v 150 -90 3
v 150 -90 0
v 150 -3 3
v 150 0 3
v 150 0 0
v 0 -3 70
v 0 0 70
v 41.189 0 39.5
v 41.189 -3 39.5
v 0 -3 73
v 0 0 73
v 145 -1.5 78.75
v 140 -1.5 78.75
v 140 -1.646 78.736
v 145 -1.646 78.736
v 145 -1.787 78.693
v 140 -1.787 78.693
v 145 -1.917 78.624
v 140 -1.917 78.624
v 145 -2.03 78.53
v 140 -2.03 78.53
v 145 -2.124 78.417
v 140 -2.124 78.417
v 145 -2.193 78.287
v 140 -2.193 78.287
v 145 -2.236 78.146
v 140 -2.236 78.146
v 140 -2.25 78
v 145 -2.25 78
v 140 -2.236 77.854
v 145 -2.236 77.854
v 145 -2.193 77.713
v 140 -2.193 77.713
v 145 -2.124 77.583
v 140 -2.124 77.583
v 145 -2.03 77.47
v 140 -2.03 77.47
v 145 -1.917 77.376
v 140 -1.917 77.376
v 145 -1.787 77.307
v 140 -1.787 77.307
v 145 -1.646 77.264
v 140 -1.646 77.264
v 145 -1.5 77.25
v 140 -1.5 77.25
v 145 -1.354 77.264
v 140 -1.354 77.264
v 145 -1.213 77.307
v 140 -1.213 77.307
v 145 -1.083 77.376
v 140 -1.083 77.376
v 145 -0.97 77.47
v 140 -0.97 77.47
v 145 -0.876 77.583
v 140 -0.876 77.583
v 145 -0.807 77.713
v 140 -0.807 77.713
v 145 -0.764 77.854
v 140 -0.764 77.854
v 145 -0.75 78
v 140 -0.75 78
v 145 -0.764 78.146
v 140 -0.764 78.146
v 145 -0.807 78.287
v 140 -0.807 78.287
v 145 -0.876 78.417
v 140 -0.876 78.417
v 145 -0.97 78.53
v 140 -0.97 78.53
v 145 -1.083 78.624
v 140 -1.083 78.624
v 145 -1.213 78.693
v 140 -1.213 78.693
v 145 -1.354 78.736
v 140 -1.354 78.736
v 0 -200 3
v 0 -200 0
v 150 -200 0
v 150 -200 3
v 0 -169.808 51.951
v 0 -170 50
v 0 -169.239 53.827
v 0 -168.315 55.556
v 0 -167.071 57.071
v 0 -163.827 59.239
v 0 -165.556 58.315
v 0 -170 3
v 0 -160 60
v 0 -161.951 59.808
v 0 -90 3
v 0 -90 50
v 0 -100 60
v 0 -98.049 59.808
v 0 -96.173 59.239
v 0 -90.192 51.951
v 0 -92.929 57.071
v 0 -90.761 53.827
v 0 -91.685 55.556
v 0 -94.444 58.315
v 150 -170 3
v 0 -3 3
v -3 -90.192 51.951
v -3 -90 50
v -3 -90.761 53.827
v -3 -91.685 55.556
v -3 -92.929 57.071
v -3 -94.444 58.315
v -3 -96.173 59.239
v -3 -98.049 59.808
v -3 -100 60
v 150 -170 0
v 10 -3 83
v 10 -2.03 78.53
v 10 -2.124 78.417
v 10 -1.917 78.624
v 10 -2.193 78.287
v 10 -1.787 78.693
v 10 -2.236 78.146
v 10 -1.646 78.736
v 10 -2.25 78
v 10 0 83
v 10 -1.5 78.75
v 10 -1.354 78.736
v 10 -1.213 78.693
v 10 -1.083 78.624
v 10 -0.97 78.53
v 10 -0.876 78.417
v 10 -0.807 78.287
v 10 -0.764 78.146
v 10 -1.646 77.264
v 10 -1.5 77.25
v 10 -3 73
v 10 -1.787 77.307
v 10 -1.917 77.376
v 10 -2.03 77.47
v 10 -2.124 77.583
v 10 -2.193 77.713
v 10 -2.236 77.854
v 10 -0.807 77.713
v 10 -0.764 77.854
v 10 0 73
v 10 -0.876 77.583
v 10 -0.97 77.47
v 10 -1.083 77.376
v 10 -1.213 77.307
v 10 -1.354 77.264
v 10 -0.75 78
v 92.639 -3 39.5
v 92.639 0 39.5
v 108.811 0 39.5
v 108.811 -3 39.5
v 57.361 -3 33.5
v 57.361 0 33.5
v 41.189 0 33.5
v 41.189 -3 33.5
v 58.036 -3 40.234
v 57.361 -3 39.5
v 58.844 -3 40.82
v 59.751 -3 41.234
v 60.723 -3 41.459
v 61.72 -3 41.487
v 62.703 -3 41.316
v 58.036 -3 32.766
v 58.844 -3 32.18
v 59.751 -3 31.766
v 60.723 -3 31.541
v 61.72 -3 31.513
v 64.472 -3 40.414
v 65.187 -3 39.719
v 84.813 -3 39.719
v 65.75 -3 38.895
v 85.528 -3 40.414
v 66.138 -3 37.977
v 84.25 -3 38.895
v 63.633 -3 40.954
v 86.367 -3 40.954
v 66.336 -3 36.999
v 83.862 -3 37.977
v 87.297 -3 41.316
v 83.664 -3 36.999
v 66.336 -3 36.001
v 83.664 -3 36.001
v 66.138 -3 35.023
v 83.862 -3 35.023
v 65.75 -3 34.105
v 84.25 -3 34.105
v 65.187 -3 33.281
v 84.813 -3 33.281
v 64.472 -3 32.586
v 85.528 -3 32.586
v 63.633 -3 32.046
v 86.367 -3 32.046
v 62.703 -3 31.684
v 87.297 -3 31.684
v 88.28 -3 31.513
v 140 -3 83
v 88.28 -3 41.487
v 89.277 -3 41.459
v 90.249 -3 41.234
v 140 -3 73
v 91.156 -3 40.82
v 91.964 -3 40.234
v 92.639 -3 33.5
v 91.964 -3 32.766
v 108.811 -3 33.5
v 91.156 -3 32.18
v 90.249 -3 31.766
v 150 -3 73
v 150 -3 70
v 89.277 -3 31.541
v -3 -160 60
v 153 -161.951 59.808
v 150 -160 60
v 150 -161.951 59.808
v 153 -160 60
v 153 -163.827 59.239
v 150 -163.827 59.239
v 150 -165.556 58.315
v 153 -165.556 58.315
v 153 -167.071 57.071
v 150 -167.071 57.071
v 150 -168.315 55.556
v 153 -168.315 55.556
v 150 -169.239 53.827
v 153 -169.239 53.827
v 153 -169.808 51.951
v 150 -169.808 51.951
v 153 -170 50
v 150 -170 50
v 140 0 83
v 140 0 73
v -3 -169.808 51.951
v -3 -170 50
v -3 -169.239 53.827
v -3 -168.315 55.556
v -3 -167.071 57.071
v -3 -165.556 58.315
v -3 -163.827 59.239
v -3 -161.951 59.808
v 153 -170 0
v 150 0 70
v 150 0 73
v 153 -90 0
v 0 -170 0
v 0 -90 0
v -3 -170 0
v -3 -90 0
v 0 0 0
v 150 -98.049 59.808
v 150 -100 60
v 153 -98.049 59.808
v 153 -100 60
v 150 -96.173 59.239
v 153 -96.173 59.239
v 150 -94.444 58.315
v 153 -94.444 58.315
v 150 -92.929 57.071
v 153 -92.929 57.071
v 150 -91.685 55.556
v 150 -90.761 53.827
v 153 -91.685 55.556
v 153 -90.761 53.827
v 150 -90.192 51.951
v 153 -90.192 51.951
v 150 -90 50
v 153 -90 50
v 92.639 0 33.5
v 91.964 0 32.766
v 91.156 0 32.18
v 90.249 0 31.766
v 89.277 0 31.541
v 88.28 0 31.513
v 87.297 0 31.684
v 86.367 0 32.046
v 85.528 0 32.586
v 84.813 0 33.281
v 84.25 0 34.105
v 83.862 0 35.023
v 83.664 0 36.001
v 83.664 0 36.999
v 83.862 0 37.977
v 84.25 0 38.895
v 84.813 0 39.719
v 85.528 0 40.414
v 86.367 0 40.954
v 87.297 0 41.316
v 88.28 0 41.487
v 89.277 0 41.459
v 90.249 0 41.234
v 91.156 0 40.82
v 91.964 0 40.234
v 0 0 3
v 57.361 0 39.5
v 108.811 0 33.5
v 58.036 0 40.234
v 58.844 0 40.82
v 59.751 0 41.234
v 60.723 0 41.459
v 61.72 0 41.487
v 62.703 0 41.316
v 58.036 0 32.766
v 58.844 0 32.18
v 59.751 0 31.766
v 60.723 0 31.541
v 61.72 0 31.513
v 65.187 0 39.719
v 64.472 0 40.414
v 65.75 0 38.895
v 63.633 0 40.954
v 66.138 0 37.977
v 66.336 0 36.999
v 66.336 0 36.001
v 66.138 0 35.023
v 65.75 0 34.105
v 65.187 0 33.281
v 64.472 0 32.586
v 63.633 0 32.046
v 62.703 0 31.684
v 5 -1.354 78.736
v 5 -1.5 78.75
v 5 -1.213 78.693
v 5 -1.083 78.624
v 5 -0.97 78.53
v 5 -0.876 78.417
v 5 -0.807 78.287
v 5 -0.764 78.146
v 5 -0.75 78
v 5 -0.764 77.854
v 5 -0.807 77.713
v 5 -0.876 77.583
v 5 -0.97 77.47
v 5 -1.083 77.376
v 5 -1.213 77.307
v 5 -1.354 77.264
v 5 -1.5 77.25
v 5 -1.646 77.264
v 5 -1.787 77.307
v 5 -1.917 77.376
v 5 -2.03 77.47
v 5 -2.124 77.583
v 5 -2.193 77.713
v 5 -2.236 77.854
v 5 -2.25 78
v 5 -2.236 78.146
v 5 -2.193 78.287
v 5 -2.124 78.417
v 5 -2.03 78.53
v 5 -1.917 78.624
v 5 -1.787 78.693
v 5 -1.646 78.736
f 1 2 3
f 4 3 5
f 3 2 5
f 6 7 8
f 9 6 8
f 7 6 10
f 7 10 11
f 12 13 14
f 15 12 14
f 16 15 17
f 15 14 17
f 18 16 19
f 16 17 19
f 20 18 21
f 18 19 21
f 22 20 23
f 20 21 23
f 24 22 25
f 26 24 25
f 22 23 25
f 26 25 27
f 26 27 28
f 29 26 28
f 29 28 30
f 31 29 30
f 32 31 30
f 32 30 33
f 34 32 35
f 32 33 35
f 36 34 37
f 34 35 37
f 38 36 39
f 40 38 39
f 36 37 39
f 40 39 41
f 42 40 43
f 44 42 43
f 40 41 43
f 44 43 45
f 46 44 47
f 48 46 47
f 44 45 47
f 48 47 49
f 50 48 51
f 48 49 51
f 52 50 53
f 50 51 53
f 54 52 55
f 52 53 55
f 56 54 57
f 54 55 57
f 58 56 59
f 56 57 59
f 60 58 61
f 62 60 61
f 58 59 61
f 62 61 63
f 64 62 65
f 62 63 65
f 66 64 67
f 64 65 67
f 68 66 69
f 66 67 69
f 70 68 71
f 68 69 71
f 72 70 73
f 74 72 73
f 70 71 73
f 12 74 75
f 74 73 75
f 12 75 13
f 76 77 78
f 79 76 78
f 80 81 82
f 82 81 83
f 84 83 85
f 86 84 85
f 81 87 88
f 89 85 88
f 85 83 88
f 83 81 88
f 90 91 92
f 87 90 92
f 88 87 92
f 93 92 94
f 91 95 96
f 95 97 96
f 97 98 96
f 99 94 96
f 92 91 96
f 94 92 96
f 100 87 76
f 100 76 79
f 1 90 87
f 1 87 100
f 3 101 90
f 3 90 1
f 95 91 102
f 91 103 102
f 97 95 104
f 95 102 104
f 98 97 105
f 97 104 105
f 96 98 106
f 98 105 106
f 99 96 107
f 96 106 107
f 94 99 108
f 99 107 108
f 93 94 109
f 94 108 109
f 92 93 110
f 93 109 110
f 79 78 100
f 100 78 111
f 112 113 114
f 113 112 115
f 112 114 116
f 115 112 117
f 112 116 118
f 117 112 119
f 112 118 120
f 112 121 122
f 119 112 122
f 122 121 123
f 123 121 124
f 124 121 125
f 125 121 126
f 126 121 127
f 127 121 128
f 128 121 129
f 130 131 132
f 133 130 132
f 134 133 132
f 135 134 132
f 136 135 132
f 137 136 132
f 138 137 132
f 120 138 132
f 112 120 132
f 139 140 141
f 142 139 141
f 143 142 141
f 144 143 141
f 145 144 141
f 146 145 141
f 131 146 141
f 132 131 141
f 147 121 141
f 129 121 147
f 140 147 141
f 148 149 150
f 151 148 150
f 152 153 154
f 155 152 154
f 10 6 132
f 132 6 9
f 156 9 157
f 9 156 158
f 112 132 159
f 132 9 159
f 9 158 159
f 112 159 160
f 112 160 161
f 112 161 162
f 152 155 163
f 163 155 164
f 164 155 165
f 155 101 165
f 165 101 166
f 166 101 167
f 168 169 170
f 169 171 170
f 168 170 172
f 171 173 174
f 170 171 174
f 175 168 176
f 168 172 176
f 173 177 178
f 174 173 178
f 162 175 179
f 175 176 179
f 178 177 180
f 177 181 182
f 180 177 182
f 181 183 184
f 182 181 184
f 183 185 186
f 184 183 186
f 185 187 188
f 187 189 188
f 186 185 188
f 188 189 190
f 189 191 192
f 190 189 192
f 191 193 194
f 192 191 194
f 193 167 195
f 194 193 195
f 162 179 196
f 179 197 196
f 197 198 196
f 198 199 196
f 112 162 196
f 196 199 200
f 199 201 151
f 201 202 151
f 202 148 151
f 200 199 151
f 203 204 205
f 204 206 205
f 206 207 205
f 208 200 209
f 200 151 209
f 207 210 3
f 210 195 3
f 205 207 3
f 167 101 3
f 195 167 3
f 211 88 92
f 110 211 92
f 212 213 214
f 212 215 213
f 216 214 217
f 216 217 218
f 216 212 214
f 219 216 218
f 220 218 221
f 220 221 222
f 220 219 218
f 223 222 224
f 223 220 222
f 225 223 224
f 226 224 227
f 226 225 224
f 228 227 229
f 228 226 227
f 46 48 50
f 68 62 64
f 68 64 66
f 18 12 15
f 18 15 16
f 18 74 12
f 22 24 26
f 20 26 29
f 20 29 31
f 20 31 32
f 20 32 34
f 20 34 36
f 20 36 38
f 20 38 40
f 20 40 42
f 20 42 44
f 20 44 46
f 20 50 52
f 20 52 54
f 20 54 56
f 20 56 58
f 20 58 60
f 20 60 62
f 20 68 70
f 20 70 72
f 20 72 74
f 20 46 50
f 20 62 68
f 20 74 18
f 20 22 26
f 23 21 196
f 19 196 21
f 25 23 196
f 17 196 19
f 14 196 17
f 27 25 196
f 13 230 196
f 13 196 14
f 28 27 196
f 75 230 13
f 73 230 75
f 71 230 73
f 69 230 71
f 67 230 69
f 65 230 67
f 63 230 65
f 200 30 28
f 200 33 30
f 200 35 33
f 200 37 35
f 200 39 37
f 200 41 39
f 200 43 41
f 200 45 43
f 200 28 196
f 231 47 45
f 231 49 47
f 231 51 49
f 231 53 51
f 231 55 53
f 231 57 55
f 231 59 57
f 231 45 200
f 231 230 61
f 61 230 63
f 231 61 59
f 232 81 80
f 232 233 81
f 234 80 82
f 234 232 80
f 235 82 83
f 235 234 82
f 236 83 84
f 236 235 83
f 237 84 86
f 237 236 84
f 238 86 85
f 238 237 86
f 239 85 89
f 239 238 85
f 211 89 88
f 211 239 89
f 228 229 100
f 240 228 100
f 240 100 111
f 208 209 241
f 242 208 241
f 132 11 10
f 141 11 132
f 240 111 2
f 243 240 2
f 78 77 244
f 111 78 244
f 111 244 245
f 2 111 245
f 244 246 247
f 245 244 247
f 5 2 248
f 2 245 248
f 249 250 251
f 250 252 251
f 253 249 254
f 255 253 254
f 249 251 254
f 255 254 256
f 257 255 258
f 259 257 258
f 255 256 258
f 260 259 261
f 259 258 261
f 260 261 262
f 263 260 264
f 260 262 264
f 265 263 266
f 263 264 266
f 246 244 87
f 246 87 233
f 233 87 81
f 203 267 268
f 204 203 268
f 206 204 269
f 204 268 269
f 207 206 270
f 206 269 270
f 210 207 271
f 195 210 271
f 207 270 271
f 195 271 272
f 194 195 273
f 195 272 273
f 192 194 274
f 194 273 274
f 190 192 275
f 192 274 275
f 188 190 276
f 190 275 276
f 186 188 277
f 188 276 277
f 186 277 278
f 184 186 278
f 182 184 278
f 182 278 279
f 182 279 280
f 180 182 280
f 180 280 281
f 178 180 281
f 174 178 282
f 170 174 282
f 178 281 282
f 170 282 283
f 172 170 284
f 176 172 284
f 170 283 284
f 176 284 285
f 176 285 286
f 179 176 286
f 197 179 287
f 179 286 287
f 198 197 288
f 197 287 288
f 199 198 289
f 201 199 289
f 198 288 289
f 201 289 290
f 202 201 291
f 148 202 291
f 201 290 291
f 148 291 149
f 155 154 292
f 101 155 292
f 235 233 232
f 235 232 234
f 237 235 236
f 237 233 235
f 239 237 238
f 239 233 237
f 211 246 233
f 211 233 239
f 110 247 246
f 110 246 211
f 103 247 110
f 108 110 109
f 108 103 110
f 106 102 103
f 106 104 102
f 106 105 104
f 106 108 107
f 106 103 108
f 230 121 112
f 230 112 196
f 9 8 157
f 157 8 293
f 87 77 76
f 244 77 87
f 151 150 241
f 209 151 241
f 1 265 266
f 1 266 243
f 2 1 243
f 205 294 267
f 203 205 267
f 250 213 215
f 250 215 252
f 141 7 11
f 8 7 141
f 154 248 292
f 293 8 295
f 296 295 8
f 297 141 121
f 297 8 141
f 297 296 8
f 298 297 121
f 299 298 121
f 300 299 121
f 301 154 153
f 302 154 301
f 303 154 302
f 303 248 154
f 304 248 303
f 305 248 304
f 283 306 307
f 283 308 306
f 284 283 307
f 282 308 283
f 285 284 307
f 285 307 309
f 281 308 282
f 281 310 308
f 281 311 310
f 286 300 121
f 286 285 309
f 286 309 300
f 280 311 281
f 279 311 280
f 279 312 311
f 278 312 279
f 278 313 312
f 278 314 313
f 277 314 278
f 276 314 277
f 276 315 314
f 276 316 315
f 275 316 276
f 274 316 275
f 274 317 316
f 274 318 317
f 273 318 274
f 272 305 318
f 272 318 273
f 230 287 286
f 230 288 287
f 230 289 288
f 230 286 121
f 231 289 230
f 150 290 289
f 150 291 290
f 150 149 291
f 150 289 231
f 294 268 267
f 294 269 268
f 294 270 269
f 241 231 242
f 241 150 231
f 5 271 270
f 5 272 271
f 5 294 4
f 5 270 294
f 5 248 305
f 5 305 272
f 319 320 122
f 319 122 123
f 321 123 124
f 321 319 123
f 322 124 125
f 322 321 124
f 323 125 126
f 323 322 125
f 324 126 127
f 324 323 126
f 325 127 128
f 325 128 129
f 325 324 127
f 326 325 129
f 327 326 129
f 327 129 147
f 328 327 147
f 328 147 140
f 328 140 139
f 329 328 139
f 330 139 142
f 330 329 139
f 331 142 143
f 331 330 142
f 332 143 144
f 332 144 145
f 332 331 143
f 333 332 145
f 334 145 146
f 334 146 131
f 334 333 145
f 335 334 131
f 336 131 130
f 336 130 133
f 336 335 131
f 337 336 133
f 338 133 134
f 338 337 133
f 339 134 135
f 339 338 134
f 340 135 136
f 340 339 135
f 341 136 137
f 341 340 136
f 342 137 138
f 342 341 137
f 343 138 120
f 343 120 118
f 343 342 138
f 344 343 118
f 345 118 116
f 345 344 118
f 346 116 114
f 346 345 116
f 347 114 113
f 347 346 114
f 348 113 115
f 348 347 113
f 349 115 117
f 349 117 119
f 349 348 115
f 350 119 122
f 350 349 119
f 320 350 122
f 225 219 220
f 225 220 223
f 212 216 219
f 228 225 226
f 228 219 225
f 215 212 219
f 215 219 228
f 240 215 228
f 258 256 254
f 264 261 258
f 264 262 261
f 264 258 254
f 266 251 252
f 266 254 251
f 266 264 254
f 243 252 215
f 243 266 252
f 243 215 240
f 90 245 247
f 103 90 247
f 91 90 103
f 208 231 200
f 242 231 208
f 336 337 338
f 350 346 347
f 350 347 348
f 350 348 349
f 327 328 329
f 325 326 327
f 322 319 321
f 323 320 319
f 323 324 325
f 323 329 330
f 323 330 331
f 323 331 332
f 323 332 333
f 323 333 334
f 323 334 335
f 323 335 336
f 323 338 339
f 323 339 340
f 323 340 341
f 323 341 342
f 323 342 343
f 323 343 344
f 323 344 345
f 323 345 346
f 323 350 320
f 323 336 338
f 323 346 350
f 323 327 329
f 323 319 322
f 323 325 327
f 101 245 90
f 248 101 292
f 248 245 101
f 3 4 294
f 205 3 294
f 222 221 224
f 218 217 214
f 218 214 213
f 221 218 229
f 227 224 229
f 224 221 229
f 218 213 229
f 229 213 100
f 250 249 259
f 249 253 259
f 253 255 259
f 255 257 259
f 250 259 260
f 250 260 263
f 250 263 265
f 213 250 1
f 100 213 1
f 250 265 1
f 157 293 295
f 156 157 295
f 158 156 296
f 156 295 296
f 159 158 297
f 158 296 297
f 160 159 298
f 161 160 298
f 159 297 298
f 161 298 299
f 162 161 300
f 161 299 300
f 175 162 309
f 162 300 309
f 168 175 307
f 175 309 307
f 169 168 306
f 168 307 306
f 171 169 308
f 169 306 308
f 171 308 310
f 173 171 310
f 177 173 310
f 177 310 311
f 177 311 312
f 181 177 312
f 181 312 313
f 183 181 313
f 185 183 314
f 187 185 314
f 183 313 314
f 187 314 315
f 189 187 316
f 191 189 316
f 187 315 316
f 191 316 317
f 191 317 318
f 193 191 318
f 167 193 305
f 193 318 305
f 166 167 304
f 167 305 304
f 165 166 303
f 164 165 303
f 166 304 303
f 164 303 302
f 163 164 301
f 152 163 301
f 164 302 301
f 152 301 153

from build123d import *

# Parameters (mm, degrees)
ESQUISSE1_W             = 150
ESQUISSE1_H             = 200
BOSS_EXTRU_1_DEPTH      = 3
ESQUISSE2_W             = 150
ESQUISSE2_H             = 3
BOSS_EXTRU_2_DEPTH      = 80
ESQUISSE3_W             = 10
ESQUISSE3_H             = 10
ENL_V_MAT_EXTRU_1_DEPTH = 80
ESQUISSE4_R             = 0.75
BOSS_EXTRU_3_DEPTH      = 5
BOSS_EXTRU_5_START      = 5
ESQUISSE6_R             = 0.75
BOSS_EXTRU_5_DEPTH      = 5
ENL_V_MAT_EXTRU_2_DEPTH = 3
ESQUISSE10_W            = 60
ESQUISSE10_H            = 80
BOSS_EXTRU_9_DEPTH      = 3
ESQUISSE11_W            = 60
ESQUISSE11_H            = 80
BOSS_EXTRU_10_DEPTH     = 3
CONG_1_R                = 10


with BuildPart() as part:
    # Esquisse1 → Boss.-Extru.1 (new body)
    with BuildSketch(Plane.XY):
        with Locations((75, -100)):
            Rectangle(ESQUISSE1_W, ESQUISSE1_H)
    extrude(amount=BOSS_EXTRU_1_DEPTH)

    # Esquisse2 → Boss.-Extru.2 (add)
    with BuildSketch(Plane.XY.offset(3)):
        with Locations((75, -1.5)):
            Rectangle(ESQUISSE2_W, ESQUISSE2_H)
    extrude(amount=BOSS_EXTRU_2_DEPTH)

    # Esquisse3 → Enlèv. mat.-Extru.1 (cut)
    with BuildSketch(Plane(origin=(0, 0, 0), x_dir=(1, 0, 0), z_dir=(0, 1, 0))):
        with Locations((5, -78)):
            Rectangle(ESQUISSE3_W, ESQUISSE3_H)
        with Locations((145, -78)):
            Rectangle(ESQUISSE3_W, ESQUISSE3_H)
    extrude(amount=-ENL_V_MAT_EXTRU_1_DEPTH, mode=Mode.SUBTRACT)

    # Esquisse4 → Boss.-Extru.3 (add)
    with BuildSketch(Plane(origin=(140, 0, 0), x_dir=(0, 0, -1), z_dir=(1, 0, 0))):
        with Locations(Location((-78, -1.5, 0), (0, 0, 180))):
            Circle(ESQUISSE4_R)
    extrude(amount=BOSS_EXTRU_3_DEPTH)

    # Esquisse6 → Boss.-Extru.5 (add)
    with BuildSketch(Plane.ZY.offset(-10).offset(BOSS_EXTRU_5_START)):
        with Locations((78, -1.5)):
            Circle(ESQUISSE6_R)
    extrude(amount=-BOSS_EXTRU_5_DEPTH)

    # Esquisse9 → Enlèv. mat.-Extru.2 (cut)
    with BuildSketch(Plane(origin=(0, 0, 0), x_dir=(1, 0, 0), z_dir=(0, 1, 0))):
        with BuildLine():
            Line((41.1892956, -33.5), (0, -3))
            Line((0, -3), (0, -70))
            Line((0, -70), (41.1892956, -39.5))
            Line((41.1892956, -39.5), (57.361053438, -39.5))
            ThreePointArc((57.361053438, -39.5), (66.361053438, -36.5), (57.361053438, -33.5))
            Line((57.361053438, -33.5), (41.1892956, -33.5))
        make_face()
        with BuildLine():
            Line((150, -70), (150, -3))
            Line((150, -3), (108.8107044, -33.5))
            Line((108.8107044, -33.5), (92.638946562, -33.5))
            ThreePointArc((92.638946562, -33.5), (83.638946562, -36.5), (92.638946562, -39.5))
            Line((92.638946562, -39.5), (108.8107044, -39.5))
            Line((108.8107044, -39.5), (150, -70))
        make_face()
    extrude(amount=-ENL_V_MAT_EXTRU_2_DEPTH, mode=Mode.SUBTRACT)

    # Esquisse10 → Boss.-Extru.9 (add)
    with BuildSketch(Plane.ZY):
        with Locations((30, -130)):
            Rectangle(ESQUISSE10_W, ESQUISSE10_H)
    extrude(amount=BOSS_EXTRU_9_DEPTH)

    # Esquisse11 → Boss.-Extru.10 (add)
    with BuildSketch(Plane(origin=(150, 0, 0), x_dir=(0, 0, -1), z_dir=(1, 0, 0))):
        with Locations((-30, -130)):
            Rectangle(ESQUISSE11_W, ESQUISSE11_H)
    extrude(amount=BOSS_EXTRU_10_DEPTH)

    # Congé1
    cong_1_edges = [part.edges().sort_by_distance(p)[0] for p in [
        (-1.5, -170, 60),
        (-1.5, -90, 60),
        (151.5, -90, 60),
        (151.5, -170, 60),
    ]]
    fillet(cong_1_edges, radius=CONG_1_R)


solid = part.part
